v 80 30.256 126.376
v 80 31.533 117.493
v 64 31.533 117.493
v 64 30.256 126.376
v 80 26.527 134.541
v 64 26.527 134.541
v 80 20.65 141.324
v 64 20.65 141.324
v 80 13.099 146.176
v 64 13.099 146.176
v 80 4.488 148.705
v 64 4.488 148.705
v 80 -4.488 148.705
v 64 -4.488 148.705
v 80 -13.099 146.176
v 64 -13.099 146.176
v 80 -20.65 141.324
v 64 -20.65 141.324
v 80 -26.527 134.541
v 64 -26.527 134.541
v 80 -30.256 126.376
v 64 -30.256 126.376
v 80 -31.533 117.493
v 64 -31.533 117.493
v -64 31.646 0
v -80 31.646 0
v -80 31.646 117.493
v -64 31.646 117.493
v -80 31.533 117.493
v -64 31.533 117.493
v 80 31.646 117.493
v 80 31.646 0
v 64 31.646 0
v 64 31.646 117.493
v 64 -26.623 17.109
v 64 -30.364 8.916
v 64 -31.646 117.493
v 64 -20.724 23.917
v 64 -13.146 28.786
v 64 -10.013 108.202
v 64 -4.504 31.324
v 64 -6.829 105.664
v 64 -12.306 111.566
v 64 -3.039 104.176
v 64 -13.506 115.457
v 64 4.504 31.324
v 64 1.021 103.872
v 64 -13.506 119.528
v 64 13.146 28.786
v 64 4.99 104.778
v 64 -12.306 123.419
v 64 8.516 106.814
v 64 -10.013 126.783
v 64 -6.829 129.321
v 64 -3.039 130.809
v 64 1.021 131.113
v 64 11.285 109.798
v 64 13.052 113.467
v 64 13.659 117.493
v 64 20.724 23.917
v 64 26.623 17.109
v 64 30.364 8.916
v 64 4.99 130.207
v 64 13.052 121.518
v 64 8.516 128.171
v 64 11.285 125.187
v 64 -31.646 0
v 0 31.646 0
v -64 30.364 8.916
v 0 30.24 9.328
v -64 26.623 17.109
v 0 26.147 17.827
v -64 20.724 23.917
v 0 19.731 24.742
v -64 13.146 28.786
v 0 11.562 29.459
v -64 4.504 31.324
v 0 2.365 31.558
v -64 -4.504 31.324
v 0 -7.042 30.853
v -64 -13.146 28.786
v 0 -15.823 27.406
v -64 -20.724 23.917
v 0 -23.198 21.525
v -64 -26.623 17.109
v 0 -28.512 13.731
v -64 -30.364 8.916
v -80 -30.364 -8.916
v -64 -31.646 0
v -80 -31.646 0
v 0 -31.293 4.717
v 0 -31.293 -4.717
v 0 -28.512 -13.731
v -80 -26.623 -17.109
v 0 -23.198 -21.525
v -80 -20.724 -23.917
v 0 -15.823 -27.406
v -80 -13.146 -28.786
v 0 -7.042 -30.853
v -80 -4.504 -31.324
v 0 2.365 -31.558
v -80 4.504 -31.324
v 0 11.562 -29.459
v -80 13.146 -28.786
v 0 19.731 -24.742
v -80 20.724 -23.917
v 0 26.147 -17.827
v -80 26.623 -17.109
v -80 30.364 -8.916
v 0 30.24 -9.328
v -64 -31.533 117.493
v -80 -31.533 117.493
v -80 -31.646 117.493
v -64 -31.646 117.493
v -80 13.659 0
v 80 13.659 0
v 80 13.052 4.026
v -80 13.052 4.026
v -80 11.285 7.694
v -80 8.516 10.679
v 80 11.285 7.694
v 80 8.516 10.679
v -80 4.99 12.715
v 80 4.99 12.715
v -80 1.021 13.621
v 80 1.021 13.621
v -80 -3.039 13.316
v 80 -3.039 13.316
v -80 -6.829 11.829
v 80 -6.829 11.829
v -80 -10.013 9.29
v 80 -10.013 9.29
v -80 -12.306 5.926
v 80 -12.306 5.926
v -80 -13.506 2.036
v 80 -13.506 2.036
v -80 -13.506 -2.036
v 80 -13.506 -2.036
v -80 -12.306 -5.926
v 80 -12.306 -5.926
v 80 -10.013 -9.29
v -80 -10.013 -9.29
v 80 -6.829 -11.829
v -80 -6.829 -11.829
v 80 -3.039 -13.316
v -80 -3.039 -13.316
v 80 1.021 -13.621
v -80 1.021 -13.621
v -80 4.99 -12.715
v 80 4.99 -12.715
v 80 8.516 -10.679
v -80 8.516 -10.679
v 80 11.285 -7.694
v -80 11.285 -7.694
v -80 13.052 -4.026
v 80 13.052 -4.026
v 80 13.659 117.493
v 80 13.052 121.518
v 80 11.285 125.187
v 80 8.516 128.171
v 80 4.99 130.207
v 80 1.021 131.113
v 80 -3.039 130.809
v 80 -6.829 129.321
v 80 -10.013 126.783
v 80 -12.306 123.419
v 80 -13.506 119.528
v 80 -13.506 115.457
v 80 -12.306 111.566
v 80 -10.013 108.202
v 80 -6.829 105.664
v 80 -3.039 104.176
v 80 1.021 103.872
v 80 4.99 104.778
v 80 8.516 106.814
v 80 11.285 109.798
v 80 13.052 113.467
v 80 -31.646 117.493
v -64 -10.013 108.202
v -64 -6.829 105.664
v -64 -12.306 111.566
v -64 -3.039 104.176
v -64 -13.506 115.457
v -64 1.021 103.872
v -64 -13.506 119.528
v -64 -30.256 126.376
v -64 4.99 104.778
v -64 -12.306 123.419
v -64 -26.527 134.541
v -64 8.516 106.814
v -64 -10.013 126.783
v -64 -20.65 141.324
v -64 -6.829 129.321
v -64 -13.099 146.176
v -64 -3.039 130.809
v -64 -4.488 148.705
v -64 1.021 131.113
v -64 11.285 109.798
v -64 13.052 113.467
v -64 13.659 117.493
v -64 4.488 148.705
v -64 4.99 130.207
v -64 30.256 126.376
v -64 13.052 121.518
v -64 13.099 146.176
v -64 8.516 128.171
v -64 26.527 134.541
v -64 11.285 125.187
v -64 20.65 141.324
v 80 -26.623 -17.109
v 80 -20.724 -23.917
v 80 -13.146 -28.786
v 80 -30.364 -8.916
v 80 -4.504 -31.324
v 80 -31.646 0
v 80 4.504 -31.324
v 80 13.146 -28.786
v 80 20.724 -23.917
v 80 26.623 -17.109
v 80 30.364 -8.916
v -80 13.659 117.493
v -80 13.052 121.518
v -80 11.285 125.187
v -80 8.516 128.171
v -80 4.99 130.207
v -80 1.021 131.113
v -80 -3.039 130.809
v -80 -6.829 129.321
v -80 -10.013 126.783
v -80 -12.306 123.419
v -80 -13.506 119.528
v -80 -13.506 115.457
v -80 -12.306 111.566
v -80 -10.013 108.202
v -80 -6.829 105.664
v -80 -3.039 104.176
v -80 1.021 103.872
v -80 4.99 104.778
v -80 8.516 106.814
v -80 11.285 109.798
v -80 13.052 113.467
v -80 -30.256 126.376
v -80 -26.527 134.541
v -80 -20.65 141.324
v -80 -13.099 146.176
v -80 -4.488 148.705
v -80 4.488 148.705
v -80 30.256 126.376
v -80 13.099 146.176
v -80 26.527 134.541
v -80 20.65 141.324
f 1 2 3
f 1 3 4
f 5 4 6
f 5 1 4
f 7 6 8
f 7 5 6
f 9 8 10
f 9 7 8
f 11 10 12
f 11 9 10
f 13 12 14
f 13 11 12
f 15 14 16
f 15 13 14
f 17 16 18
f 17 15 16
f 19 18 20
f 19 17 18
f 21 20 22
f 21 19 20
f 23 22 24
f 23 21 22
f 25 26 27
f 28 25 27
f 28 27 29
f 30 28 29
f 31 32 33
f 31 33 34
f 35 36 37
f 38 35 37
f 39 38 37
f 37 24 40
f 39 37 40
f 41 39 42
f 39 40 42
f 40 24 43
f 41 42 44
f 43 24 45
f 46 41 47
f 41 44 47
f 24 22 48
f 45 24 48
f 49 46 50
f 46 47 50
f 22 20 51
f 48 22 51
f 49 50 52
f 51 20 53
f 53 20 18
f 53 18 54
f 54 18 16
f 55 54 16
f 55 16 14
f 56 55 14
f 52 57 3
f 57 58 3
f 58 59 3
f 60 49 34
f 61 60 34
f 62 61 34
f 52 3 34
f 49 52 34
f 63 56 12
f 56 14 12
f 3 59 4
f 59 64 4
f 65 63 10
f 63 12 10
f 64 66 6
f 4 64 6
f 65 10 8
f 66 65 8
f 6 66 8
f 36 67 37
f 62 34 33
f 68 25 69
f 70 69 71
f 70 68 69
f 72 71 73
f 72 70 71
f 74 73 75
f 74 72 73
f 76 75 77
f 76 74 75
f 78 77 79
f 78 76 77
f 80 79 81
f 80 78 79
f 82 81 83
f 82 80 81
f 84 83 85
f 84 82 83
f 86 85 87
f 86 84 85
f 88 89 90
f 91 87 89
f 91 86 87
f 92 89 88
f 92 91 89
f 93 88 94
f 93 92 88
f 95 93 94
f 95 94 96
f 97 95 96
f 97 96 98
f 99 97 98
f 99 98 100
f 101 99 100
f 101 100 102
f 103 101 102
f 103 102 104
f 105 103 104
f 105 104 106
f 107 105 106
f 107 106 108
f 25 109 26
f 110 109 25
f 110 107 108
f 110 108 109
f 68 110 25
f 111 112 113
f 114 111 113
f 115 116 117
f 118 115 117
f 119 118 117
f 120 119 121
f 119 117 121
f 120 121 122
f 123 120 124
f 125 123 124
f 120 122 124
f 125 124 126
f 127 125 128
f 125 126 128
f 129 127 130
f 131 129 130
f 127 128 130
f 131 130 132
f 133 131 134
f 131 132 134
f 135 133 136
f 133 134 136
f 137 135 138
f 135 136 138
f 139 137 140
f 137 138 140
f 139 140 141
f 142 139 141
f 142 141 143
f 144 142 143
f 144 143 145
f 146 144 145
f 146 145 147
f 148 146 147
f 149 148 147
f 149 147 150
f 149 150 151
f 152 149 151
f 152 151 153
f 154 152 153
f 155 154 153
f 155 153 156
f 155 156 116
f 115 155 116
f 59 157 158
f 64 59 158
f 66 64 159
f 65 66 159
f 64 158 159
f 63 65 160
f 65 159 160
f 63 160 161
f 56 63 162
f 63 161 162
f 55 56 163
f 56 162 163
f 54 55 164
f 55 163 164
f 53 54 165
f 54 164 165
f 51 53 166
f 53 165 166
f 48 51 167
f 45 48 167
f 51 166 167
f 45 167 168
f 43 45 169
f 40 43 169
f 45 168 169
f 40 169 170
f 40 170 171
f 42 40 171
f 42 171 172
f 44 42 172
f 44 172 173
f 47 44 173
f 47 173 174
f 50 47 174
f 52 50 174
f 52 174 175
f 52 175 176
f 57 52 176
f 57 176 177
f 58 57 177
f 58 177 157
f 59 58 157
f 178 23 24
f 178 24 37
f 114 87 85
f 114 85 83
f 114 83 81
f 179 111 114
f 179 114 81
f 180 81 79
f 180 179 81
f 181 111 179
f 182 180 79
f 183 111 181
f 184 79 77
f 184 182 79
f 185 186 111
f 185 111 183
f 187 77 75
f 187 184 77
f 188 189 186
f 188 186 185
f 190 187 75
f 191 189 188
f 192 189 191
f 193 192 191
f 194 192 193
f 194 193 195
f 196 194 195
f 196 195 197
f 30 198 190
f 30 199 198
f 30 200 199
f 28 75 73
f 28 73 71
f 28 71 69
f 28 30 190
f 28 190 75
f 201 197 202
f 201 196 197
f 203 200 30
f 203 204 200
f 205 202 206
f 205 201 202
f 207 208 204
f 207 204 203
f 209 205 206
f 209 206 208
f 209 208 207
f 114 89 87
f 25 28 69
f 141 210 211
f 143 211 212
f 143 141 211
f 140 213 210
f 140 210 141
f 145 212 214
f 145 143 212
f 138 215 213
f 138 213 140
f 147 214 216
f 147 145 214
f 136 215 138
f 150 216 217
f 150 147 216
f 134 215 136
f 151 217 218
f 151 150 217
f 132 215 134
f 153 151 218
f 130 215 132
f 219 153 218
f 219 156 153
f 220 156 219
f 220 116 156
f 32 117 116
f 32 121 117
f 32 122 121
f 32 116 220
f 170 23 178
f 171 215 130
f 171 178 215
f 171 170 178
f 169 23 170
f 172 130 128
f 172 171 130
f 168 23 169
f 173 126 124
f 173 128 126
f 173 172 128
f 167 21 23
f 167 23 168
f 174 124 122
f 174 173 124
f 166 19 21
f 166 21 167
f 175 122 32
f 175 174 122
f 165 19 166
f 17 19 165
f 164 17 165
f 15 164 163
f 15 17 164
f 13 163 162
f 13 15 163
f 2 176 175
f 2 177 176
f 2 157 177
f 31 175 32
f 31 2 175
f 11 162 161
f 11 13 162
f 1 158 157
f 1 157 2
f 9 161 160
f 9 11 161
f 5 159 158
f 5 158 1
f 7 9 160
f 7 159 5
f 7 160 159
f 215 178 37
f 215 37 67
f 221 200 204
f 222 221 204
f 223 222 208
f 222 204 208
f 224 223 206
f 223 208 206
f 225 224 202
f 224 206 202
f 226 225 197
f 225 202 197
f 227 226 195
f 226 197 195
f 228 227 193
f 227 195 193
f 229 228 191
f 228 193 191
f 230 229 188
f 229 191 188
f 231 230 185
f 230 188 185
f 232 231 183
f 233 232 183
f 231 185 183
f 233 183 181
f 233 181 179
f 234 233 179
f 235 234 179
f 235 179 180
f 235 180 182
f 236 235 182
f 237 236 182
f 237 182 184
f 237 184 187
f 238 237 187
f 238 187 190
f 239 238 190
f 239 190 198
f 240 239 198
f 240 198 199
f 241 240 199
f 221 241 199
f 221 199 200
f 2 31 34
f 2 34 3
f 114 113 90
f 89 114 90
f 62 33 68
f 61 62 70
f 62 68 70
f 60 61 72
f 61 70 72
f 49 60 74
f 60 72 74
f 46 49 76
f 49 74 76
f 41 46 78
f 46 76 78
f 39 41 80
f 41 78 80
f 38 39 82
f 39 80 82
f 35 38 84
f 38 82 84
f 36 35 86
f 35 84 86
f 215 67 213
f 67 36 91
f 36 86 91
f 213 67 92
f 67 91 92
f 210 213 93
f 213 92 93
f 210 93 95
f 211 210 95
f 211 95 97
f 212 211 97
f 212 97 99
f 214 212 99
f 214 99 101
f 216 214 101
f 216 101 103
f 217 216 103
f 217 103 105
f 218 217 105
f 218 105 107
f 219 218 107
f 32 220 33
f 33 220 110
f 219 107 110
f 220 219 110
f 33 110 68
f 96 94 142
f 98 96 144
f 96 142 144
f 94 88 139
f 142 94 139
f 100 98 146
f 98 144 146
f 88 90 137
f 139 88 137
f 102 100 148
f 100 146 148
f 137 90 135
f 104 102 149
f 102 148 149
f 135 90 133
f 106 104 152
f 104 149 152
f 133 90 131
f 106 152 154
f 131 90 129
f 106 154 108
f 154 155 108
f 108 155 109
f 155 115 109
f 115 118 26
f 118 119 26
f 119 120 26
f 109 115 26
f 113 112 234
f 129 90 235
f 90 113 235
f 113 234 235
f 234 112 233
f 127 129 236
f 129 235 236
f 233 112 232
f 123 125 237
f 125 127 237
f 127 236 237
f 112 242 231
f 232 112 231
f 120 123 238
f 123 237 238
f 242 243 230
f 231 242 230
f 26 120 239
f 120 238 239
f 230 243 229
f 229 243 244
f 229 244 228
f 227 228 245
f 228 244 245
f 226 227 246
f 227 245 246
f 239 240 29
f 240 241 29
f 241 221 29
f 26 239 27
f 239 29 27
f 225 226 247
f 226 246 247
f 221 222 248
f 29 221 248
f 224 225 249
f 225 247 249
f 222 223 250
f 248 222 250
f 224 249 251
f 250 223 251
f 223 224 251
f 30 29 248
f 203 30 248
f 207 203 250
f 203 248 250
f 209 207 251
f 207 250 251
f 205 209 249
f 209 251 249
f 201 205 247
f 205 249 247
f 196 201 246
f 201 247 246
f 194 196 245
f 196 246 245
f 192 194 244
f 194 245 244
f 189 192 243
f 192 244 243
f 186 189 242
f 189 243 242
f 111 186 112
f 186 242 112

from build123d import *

# Parameters (mm, degrees)
F0_R      = 31.646266
F1_DEPTH  = 80
F3_DEPTH  = 16
F4_R      = 31.533249
F5_DEPTH  = 16
F7_R      = 13.658774
F8_DEPTH  = 193
F9_R      = 13.658775
F10_DEPTH = 212


with BuildPart() as f1:
    # F0 (on Right) → F1 (new body)
    with BuildSketch(Plane.YZ):
        Circle(F0_R)
    extrude(amount=F1_DEPTH)

    # F2 (on face) → F3 (join)
    with BuildSketch(Plane.YZ.offset(80)):
        with BuildLine():
            Line((31.646266, 0), (31.646266, 117.492504))
            Line((31.646266, 117.492504), (-31.646266, 117.492504))
            Line((-31.646266, 117.492504), (-31.646266, 0))
            ThreePointArc((-31.646266, 0), (0, 31.646266), (31.646266, 0))
        make_face()
        with BuildLine():
            ThreePointArc((-31.646266, 0), (0, -31.646266), (31.646266, 0))
            Line((31.646266, 0), (-31.646266, 0))
        make_face()
    extrude(amount=-F3_DEPTH)

    # F4 (on face) → F5 (join)
    with BuildSketch(Plane.YZ.offset(80)):
        with Locations((0, 117.492504)):
            Circle(F4_R)
    extrude(amount=-F5_DEPTH)

    # F6: F1 across face


with BuildPart() as f1_1:
    add(f1.part)
    add(f1.part.mirror(Plane(origin=(0, 0, 0), x_dir=(0, 1, 0), z_dir=(-1, 0, 0))))

    # F7 (on face) → F8 (cut)
    with BuildSketch(Plane.YZ.offset(80)):
        Circle(F7_R)
    extrude(amount=-F8_DEPTH, mode=Mode.SUBTRACT)

    # F9 (on face) → F10 (cut)
    with BuildSketch(Plane.YZ.offset(80)):
        with Locations((0, 117.492504)):
            Circle(F9_R)
    extrude(amount=-F10_DEPTH, mode=Mode.SUBTRACT)


solid = f1_1.part
